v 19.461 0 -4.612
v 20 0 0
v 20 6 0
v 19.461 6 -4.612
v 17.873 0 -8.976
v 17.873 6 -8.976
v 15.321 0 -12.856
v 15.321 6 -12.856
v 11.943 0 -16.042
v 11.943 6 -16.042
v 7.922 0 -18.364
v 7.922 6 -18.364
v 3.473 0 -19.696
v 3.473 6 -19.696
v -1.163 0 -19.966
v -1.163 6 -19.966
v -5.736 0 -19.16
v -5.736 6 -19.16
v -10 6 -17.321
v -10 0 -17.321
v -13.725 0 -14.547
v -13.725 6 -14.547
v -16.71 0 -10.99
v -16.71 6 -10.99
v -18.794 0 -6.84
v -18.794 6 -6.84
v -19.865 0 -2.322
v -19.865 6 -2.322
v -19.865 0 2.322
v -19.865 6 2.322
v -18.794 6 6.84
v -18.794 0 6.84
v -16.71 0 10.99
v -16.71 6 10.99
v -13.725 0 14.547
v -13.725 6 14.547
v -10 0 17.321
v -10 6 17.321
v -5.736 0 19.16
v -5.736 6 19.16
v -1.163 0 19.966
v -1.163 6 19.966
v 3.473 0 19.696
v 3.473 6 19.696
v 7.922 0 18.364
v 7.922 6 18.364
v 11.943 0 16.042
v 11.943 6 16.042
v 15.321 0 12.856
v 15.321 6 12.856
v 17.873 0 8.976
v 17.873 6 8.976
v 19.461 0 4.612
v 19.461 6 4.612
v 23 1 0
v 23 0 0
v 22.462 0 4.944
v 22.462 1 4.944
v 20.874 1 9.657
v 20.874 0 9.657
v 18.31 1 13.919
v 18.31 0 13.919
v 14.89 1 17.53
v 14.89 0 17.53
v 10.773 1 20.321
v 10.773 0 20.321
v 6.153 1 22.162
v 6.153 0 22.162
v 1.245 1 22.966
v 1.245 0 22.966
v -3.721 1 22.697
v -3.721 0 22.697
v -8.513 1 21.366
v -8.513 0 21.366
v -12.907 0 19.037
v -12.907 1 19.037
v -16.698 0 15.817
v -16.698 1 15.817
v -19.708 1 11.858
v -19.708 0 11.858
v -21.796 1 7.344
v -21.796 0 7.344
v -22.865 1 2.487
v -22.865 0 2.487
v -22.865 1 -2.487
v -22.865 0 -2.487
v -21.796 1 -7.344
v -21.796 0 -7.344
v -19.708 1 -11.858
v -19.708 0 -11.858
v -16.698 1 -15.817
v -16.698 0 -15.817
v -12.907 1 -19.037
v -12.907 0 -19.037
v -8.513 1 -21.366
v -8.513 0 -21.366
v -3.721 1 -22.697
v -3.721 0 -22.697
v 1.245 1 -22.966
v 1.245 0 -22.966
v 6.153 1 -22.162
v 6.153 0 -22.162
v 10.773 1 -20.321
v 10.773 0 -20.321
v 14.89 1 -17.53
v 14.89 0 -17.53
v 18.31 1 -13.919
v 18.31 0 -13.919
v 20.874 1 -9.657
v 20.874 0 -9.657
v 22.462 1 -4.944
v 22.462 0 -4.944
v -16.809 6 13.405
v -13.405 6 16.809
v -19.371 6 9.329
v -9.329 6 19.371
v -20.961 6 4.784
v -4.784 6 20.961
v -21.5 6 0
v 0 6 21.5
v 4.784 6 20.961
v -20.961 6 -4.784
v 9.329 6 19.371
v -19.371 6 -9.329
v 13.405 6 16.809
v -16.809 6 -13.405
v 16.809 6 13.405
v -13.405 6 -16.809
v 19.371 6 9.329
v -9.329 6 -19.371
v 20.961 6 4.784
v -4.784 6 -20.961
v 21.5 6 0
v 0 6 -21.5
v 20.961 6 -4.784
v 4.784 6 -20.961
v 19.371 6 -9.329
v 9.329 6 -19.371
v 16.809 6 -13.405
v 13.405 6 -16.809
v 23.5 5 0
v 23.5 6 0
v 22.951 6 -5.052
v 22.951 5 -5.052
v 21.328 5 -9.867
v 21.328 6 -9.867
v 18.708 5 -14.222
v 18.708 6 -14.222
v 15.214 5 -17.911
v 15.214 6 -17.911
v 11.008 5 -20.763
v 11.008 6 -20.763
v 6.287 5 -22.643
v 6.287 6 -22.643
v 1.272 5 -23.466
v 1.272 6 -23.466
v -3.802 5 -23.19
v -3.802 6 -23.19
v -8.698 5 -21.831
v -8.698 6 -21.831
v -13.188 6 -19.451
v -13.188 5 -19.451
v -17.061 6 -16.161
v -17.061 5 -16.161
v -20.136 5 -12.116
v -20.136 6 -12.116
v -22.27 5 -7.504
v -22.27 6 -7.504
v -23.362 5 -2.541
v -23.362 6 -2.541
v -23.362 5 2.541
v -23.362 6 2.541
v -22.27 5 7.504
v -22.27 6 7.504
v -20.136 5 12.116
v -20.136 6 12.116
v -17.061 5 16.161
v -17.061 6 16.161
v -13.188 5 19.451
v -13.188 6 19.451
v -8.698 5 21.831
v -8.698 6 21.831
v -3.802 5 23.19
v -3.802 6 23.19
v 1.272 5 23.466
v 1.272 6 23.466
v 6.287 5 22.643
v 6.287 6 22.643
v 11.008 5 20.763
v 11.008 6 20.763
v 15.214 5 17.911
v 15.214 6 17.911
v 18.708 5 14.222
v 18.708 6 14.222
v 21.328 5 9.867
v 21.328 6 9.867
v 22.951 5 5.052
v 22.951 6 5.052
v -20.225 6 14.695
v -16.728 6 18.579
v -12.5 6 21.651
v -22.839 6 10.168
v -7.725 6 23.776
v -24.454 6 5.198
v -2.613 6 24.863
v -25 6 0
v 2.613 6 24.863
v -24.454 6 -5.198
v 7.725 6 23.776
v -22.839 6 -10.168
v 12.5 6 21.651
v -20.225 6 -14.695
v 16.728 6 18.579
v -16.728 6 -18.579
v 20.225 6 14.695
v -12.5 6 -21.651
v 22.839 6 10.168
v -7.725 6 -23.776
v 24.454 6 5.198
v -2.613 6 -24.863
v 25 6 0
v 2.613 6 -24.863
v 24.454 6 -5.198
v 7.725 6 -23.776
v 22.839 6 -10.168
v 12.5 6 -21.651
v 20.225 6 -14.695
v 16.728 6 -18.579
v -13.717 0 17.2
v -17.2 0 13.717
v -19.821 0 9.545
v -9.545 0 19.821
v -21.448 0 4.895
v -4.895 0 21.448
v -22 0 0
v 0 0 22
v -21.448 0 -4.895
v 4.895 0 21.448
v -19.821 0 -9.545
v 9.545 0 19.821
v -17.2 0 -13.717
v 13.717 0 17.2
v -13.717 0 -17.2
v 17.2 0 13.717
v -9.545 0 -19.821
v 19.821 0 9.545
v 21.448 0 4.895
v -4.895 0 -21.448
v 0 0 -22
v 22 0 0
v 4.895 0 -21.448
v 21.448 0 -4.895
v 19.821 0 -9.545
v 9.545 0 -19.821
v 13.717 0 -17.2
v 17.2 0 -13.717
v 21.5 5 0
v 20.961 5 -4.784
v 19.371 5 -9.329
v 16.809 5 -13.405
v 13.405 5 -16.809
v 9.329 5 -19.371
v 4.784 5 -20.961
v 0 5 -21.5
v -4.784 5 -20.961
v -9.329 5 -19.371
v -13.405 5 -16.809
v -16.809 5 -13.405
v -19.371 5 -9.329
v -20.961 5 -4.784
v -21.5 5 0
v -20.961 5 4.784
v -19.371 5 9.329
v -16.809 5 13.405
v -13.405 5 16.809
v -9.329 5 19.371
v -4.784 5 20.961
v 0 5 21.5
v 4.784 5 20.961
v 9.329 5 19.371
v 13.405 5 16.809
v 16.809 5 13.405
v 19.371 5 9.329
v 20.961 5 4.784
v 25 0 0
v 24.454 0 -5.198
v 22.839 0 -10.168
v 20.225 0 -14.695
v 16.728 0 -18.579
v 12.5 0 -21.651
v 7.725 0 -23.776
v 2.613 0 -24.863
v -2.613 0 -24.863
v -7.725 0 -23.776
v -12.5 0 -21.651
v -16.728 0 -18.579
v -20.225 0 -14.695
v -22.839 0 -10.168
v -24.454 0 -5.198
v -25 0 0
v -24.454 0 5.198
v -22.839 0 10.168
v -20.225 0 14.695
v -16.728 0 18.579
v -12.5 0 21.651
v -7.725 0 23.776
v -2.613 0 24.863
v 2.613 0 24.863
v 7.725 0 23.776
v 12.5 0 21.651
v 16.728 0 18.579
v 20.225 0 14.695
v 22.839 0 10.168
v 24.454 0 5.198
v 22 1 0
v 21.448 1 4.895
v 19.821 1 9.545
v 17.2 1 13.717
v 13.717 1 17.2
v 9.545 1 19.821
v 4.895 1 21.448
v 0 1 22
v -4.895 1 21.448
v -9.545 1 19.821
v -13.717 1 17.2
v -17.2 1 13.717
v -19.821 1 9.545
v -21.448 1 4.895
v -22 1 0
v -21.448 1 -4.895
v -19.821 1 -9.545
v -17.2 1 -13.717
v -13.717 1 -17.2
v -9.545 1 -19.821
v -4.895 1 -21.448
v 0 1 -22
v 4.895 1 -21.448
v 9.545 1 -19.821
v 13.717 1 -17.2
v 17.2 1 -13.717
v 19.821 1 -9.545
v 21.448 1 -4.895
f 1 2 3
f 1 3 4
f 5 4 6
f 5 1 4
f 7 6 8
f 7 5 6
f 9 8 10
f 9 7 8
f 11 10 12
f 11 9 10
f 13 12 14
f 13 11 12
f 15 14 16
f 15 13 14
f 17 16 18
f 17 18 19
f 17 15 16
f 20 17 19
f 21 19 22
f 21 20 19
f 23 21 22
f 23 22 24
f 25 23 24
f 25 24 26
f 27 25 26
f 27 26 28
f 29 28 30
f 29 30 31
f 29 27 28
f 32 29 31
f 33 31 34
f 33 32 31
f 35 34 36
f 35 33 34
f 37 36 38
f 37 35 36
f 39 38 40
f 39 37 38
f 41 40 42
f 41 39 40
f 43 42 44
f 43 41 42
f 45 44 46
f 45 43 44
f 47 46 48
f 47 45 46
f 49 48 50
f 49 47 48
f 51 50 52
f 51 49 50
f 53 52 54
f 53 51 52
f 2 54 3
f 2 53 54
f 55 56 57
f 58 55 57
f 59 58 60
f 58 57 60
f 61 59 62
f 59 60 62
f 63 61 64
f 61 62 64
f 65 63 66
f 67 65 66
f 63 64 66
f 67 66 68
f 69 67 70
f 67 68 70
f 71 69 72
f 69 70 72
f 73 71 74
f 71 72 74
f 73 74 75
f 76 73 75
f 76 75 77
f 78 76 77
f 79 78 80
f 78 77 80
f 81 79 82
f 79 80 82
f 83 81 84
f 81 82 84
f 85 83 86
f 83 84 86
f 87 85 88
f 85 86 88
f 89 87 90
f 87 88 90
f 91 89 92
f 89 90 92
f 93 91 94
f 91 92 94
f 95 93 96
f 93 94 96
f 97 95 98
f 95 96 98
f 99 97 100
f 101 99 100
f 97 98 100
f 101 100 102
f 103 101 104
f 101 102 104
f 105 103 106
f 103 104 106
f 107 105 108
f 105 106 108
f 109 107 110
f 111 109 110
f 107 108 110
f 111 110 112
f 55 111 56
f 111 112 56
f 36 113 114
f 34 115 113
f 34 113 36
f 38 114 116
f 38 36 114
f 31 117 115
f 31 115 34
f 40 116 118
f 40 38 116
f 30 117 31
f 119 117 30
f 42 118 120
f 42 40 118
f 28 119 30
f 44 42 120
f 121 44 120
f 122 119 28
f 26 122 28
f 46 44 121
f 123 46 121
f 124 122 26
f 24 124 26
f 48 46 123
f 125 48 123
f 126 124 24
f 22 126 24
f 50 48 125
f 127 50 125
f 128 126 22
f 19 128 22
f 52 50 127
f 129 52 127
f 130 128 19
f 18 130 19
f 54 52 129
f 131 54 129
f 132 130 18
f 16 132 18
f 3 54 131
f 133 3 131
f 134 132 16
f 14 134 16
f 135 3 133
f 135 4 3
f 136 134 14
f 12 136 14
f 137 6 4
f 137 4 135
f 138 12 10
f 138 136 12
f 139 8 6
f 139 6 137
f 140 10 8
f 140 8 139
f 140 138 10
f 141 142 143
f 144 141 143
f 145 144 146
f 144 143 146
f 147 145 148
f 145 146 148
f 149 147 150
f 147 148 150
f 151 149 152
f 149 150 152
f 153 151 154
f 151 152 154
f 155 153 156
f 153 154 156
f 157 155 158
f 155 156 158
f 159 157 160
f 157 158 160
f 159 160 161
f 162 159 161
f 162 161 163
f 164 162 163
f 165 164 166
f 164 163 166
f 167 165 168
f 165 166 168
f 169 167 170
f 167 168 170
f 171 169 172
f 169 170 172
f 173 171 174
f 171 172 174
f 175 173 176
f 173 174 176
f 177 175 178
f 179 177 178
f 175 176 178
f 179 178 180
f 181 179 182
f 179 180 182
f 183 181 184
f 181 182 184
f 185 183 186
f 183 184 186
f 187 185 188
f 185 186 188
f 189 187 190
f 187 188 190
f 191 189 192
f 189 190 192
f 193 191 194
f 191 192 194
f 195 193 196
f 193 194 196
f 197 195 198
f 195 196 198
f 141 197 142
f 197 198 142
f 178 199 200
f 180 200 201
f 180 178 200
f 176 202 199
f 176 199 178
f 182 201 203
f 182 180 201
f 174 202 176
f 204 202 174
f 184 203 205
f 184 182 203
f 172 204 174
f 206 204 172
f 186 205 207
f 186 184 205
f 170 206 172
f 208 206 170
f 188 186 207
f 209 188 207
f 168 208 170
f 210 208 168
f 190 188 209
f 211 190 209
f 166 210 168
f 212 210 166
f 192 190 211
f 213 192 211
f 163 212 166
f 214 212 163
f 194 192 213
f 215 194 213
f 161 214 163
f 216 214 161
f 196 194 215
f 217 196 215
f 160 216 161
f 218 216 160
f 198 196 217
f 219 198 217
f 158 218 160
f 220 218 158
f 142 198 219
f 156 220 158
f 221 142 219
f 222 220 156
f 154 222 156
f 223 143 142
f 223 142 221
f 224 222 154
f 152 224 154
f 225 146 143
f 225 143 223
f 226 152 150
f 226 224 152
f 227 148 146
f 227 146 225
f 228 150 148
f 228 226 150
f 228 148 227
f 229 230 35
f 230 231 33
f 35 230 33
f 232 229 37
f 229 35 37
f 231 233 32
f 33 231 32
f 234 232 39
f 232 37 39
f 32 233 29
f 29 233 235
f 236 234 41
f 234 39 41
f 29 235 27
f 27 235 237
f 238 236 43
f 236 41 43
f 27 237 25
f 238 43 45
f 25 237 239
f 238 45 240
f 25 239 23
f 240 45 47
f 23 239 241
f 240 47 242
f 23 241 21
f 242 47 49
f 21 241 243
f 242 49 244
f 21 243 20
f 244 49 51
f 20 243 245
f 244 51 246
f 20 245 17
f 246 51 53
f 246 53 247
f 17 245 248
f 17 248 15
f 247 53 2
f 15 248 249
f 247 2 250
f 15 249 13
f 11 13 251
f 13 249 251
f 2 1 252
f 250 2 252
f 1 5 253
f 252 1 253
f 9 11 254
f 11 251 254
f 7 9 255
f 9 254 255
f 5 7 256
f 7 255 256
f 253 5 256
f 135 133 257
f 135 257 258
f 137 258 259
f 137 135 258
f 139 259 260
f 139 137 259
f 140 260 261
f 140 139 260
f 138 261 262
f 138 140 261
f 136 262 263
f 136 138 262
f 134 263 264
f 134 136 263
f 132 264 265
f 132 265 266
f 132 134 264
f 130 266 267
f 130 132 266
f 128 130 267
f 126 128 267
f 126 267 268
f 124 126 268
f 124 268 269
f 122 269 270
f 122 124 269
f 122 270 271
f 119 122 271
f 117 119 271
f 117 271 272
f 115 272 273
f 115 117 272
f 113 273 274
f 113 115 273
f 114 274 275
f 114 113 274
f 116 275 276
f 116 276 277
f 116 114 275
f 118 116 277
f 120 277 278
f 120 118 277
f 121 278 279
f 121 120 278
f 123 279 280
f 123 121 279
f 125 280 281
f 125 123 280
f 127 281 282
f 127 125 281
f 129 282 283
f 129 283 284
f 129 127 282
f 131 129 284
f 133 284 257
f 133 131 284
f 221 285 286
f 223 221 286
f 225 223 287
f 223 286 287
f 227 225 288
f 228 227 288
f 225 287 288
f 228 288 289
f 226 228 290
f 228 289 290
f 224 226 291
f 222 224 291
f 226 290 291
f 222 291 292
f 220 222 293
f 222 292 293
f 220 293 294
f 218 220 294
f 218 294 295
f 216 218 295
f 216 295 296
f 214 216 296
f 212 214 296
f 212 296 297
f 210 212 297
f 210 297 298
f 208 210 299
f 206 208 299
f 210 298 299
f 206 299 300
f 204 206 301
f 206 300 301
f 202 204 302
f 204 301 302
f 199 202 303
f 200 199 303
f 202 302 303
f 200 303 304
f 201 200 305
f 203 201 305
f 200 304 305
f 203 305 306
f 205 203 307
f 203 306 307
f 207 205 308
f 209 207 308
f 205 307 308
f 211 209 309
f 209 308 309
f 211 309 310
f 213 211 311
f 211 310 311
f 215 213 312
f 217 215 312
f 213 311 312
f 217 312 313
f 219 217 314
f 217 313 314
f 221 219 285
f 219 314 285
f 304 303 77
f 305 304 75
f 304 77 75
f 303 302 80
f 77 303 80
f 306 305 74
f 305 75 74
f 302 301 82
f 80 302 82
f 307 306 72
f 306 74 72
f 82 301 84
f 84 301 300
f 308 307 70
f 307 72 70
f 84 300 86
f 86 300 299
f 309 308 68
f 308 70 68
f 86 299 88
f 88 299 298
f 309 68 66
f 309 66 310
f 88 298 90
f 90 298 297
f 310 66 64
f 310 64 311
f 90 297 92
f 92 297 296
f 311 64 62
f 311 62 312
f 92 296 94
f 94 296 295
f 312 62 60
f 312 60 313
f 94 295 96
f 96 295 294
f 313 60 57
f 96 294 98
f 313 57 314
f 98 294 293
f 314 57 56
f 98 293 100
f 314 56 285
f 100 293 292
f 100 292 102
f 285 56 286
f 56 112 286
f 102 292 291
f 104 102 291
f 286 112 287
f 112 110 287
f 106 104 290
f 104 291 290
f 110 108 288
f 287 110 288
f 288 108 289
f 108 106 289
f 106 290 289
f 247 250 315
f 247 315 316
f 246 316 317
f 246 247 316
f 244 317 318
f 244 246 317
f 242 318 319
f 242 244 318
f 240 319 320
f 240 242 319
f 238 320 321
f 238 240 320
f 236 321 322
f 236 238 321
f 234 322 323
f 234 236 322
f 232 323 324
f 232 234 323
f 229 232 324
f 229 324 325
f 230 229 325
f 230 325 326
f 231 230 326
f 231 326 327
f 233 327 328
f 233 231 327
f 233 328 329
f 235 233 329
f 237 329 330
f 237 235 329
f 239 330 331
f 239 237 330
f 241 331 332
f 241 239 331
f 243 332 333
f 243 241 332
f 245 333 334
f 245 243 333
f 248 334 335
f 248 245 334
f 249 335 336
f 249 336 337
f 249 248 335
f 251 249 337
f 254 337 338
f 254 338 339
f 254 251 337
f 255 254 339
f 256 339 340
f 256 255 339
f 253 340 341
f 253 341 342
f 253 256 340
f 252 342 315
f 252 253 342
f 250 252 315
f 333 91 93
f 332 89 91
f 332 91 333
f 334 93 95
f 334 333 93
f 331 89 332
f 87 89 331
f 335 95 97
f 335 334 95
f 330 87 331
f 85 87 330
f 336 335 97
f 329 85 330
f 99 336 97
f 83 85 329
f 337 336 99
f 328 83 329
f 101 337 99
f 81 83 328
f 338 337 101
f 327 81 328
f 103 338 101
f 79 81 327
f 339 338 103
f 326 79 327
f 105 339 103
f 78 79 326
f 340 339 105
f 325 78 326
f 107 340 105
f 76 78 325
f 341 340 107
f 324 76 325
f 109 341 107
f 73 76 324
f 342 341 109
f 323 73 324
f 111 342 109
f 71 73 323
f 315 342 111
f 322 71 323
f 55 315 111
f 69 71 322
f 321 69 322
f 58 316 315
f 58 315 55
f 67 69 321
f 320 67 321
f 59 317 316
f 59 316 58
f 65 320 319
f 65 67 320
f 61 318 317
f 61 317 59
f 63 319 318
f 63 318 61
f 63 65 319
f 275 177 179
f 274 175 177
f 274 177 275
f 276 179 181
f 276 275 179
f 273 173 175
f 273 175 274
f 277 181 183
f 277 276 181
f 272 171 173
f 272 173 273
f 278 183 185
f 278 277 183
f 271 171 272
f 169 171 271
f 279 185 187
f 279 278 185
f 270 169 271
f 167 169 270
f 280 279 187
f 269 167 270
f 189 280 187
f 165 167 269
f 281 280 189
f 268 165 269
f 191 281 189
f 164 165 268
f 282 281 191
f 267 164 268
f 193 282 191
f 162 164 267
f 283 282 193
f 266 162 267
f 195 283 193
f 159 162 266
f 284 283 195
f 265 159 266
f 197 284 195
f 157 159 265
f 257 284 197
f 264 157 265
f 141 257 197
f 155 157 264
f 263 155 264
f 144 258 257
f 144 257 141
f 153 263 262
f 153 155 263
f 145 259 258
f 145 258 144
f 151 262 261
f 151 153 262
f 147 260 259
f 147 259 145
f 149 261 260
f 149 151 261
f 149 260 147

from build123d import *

# Parameters (mm, degrees)
SKETCH1_R           = 25
SKETCH1_R_2         = 20
BOSS_EXTRUDE1_DEPTH = 6
SKETCH2_R           = 23.5
SKETCH2_R_2         = 21.5
CUT_EXTRUDE1_DEPTH  = 1
SKETCH3_R           = 23
SKETCH3_R_2         = 22
CUT_EXTRUDE2_DEPTH  = 1


with BuildPart() as part:
    # Sketch1 → Boss-Extrude1 (new body)
    with BuildSketch(Plane(origin=(0, 0, 0), x_dir=(1, 0, 0), z_dir=(0, 1, 0))):
        Circle(SKETCH1_R)
        Circle(SKETCH1_R_2, mode=Mode.SUBTRACT)
    extrude(amount=BOSS_EXTRUDE1_DEPTH)

    # Sketch2 → Cut-Extrude1 (cut)
    with BuildSketch(Plane(origin=(0, 6, 0), x_dir=(1, 0, 0), z_dir=(0, 1, 0))):
        Circle(SKETCH2_R)
        Circle(SKETCH2_R_2, mode=Mode.SUBTRACT)
    extrude(amount=-CUT_EXTRUDE1_DEPTH, mode=Mode.SUBTRACT)

    # Sketch3 → Cut-Extrude2 (cut)
    with BuildSketch(Plane.XZ):
        Circle(SKETCH3_R)
        Circle(SKETCH3_R_2, mode=Mode.SUBTRACT)
    extrude(amount=-CUT_EXTRUDE2_DEPTH, mode=Mode.SUBTRACT)


solid = part.part
